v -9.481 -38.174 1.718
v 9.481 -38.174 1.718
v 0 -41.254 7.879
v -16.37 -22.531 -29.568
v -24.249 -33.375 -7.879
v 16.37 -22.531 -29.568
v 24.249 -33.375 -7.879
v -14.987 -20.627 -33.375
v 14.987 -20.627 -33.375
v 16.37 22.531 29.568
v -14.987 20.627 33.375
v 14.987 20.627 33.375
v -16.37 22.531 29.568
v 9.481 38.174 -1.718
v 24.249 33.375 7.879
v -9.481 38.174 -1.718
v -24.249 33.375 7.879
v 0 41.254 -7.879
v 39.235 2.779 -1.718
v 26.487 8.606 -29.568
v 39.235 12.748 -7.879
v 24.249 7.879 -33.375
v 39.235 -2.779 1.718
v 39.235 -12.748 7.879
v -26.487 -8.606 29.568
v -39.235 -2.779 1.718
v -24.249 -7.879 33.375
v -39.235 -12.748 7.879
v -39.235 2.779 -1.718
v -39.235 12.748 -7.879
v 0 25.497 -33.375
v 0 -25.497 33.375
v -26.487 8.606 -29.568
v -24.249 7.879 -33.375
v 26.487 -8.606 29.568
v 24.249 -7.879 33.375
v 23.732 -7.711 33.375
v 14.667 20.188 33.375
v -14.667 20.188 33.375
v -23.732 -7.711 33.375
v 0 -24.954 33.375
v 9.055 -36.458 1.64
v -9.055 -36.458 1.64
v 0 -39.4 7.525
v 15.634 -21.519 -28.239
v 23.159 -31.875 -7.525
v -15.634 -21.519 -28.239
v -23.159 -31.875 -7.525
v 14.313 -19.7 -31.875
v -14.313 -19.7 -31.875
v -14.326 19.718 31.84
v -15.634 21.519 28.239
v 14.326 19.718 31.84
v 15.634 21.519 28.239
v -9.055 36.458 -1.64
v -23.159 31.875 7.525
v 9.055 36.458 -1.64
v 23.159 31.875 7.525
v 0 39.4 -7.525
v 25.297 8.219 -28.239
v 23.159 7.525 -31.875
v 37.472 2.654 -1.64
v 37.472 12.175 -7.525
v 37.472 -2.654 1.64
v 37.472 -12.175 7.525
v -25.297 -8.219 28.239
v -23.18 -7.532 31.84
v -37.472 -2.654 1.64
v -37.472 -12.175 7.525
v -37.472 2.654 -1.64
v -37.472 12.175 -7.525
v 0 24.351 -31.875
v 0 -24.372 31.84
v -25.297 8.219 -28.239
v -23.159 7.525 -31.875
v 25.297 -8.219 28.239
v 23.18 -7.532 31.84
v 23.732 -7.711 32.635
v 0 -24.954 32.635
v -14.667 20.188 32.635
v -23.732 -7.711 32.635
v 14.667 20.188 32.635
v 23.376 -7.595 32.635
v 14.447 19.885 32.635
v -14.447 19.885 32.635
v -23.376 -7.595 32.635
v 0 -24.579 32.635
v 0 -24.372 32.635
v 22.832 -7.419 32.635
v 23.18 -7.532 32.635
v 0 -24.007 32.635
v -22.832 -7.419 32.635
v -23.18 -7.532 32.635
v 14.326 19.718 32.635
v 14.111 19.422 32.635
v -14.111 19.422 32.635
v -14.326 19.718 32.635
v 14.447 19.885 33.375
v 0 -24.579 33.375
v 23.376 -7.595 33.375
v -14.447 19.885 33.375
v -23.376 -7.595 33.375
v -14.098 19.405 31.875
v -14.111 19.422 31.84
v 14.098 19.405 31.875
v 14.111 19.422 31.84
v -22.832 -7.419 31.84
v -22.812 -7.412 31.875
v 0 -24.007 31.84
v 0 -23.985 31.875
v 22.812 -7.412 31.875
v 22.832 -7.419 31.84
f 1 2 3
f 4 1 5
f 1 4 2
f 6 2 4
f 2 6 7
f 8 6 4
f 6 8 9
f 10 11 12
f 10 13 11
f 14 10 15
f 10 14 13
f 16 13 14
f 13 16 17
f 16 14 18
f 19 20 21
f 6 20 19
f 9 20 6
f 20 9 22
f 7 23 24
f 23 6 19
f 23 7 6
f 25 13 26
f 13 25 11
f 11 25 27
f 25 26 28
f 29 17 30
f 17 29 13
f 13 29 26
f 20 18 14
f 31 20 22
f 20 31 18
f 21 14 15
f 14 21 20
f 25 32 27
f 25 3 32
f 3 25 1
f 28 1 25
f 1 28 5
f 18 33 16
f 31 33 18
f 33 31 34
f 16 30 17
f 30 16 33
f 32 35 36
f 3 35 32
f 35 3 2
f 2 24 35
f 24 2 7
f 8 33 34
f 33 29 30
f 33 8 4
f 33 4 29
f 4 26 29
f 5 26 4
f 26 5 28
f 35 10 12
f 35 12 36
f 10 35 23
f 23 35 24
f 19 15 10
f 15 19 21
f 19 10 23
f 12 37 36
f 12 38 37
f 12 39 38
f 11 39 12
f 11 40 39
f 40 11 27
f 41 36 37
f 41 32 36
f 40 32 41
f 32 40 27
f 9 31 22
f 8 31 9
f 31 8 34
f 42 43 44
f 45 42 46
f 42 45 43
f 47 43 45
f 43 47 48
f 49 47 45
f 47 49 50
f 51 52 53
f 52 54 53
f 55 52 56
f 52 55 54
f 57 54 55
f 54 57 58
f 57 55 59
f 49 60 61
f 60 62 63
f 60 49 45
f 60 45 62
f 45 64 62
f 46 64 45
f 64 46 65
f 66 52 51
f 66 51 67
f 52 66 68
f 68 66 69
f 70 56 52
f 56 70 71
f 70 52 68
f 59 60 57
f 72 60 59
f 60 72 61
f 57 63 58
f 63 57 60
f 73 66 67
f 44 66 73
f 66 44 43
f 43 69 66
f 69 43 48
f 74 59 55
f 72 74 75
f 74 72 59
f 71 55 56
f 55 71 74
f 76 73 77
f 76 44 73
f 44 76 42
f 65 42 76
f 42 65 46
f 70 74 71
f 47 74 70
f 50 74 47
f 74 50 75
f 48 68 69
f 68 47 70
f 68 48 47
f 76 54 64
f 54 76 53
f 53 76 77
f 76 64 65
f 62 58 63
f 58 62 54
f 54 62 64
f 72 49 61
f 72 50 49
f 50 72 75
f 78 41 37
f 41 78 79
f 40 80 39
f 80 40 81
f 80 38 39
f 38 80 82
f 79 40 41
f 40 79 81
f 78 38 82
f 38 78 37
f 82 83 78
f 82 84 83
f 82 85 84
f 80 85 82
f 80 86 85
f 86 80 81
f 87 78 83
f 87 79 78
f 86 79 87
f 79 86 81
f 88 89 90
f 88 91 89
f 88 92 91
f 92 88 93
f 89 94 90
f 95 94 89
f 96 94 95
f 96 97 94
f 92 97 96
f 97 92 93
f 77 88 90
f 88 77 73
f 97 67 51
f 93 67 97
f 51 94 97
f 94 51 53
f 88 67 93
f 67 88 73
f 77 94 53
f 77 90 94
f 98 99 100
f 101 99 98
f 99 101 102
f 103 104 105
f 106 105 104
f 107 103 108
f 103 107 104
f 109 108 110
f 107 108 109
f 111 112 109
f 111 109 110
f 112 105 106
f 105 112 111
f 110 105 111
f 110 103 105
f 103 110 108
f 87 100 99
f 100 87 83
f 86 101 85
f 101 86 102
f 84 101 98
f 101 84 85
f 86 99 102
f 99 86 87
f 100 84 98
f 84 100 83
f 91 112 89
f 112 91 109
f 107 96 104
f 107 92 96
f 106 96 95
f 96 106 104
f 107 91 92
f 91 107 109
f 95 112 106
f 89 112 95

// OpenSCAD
hauteurExt = 66.751;
epaisseurParoi = 1.5;
diametreTrouBouchon = 1.6;
r = 0.19; // résolution d'impression sur l'axe Z
echelleReductionAjustementBouchon = 0.985;
hauteurInt = hauteurExt - 2 * epaisseurParoi;

//dode_creux();
//decoupe_bouchon();
corps_ouvert();
//bouchon_avec_attache();
bouchon();
//bouchon_trou();

module corps_ouvert() {
	difference() {
		dode_creux();
		decoupe_bouchon();
	}
}

module bouchon_avec_attache() {
	scale([echelleReductionAjustementBouchon, echelleReductionAjustementBouchon, 0.995])
	union () {
		intersection() {
			dode_creux();
			decoupe_bouchon();
		}
		translate([0, 0, hauteurExt/2])
		rotate([90, 0, 54])
		rotate_extrude(convexity = 10, $fn=40)
		translate([1, 0, 0])
		circle(r = 0.5, $fn=40);
	}
}

module bouchon_trou() {
	scale([echelleReductionAjustementBouchon, echelleReductionAjustementBouchon, 1])
	difference () {
		intersection() {
			dode_creux();
			decoupe_bouchon();
		}
		translate([0, 0, hauteurExt/2.5])
		cylinder(30, r=diametreTrouBouchon/2, $fn=22);
	}
}

module bouchon() {
    //rotate([0,180,0])
	scale([echelleReductionAjustementBouchon, echelleReductionAjustementBouchon, 1])
	difference () {
		intersection() {
			dode_creux();
			decoupe_bouchon();
		}
	}
}

module dode_creux() {
	difference() {
		dodecahedron(hauteurExt);
		dodecahedron(hauteurInt);
	}
}

module decoupe_bouchon() {
    distance = hauteurInt/2+4*r;
	rotate([0,0,54]) translate([0,0,distance])
		cylinder(epaisseurParoi, r=hauteurExt/2.675, $fn=5);
	rotate([0,0,54]) translate([0,0,distance-epaisseurParoi])
		cylinder(epaisseurParoi, r=hauteurExt/2.58-epaisseurParoi, $fn=5);
}

module dodecahedron(height) {
	scale([height,height,height]) {
		intersection() {
			cube([2,2,1], center = true); 
			intersection_for(i=[0:4]) { 
				rotate([0,0,72*i])
				rotate([116.565,0,0])
					cube([2,2,1], center = true); 
			}
		}
	}
}
